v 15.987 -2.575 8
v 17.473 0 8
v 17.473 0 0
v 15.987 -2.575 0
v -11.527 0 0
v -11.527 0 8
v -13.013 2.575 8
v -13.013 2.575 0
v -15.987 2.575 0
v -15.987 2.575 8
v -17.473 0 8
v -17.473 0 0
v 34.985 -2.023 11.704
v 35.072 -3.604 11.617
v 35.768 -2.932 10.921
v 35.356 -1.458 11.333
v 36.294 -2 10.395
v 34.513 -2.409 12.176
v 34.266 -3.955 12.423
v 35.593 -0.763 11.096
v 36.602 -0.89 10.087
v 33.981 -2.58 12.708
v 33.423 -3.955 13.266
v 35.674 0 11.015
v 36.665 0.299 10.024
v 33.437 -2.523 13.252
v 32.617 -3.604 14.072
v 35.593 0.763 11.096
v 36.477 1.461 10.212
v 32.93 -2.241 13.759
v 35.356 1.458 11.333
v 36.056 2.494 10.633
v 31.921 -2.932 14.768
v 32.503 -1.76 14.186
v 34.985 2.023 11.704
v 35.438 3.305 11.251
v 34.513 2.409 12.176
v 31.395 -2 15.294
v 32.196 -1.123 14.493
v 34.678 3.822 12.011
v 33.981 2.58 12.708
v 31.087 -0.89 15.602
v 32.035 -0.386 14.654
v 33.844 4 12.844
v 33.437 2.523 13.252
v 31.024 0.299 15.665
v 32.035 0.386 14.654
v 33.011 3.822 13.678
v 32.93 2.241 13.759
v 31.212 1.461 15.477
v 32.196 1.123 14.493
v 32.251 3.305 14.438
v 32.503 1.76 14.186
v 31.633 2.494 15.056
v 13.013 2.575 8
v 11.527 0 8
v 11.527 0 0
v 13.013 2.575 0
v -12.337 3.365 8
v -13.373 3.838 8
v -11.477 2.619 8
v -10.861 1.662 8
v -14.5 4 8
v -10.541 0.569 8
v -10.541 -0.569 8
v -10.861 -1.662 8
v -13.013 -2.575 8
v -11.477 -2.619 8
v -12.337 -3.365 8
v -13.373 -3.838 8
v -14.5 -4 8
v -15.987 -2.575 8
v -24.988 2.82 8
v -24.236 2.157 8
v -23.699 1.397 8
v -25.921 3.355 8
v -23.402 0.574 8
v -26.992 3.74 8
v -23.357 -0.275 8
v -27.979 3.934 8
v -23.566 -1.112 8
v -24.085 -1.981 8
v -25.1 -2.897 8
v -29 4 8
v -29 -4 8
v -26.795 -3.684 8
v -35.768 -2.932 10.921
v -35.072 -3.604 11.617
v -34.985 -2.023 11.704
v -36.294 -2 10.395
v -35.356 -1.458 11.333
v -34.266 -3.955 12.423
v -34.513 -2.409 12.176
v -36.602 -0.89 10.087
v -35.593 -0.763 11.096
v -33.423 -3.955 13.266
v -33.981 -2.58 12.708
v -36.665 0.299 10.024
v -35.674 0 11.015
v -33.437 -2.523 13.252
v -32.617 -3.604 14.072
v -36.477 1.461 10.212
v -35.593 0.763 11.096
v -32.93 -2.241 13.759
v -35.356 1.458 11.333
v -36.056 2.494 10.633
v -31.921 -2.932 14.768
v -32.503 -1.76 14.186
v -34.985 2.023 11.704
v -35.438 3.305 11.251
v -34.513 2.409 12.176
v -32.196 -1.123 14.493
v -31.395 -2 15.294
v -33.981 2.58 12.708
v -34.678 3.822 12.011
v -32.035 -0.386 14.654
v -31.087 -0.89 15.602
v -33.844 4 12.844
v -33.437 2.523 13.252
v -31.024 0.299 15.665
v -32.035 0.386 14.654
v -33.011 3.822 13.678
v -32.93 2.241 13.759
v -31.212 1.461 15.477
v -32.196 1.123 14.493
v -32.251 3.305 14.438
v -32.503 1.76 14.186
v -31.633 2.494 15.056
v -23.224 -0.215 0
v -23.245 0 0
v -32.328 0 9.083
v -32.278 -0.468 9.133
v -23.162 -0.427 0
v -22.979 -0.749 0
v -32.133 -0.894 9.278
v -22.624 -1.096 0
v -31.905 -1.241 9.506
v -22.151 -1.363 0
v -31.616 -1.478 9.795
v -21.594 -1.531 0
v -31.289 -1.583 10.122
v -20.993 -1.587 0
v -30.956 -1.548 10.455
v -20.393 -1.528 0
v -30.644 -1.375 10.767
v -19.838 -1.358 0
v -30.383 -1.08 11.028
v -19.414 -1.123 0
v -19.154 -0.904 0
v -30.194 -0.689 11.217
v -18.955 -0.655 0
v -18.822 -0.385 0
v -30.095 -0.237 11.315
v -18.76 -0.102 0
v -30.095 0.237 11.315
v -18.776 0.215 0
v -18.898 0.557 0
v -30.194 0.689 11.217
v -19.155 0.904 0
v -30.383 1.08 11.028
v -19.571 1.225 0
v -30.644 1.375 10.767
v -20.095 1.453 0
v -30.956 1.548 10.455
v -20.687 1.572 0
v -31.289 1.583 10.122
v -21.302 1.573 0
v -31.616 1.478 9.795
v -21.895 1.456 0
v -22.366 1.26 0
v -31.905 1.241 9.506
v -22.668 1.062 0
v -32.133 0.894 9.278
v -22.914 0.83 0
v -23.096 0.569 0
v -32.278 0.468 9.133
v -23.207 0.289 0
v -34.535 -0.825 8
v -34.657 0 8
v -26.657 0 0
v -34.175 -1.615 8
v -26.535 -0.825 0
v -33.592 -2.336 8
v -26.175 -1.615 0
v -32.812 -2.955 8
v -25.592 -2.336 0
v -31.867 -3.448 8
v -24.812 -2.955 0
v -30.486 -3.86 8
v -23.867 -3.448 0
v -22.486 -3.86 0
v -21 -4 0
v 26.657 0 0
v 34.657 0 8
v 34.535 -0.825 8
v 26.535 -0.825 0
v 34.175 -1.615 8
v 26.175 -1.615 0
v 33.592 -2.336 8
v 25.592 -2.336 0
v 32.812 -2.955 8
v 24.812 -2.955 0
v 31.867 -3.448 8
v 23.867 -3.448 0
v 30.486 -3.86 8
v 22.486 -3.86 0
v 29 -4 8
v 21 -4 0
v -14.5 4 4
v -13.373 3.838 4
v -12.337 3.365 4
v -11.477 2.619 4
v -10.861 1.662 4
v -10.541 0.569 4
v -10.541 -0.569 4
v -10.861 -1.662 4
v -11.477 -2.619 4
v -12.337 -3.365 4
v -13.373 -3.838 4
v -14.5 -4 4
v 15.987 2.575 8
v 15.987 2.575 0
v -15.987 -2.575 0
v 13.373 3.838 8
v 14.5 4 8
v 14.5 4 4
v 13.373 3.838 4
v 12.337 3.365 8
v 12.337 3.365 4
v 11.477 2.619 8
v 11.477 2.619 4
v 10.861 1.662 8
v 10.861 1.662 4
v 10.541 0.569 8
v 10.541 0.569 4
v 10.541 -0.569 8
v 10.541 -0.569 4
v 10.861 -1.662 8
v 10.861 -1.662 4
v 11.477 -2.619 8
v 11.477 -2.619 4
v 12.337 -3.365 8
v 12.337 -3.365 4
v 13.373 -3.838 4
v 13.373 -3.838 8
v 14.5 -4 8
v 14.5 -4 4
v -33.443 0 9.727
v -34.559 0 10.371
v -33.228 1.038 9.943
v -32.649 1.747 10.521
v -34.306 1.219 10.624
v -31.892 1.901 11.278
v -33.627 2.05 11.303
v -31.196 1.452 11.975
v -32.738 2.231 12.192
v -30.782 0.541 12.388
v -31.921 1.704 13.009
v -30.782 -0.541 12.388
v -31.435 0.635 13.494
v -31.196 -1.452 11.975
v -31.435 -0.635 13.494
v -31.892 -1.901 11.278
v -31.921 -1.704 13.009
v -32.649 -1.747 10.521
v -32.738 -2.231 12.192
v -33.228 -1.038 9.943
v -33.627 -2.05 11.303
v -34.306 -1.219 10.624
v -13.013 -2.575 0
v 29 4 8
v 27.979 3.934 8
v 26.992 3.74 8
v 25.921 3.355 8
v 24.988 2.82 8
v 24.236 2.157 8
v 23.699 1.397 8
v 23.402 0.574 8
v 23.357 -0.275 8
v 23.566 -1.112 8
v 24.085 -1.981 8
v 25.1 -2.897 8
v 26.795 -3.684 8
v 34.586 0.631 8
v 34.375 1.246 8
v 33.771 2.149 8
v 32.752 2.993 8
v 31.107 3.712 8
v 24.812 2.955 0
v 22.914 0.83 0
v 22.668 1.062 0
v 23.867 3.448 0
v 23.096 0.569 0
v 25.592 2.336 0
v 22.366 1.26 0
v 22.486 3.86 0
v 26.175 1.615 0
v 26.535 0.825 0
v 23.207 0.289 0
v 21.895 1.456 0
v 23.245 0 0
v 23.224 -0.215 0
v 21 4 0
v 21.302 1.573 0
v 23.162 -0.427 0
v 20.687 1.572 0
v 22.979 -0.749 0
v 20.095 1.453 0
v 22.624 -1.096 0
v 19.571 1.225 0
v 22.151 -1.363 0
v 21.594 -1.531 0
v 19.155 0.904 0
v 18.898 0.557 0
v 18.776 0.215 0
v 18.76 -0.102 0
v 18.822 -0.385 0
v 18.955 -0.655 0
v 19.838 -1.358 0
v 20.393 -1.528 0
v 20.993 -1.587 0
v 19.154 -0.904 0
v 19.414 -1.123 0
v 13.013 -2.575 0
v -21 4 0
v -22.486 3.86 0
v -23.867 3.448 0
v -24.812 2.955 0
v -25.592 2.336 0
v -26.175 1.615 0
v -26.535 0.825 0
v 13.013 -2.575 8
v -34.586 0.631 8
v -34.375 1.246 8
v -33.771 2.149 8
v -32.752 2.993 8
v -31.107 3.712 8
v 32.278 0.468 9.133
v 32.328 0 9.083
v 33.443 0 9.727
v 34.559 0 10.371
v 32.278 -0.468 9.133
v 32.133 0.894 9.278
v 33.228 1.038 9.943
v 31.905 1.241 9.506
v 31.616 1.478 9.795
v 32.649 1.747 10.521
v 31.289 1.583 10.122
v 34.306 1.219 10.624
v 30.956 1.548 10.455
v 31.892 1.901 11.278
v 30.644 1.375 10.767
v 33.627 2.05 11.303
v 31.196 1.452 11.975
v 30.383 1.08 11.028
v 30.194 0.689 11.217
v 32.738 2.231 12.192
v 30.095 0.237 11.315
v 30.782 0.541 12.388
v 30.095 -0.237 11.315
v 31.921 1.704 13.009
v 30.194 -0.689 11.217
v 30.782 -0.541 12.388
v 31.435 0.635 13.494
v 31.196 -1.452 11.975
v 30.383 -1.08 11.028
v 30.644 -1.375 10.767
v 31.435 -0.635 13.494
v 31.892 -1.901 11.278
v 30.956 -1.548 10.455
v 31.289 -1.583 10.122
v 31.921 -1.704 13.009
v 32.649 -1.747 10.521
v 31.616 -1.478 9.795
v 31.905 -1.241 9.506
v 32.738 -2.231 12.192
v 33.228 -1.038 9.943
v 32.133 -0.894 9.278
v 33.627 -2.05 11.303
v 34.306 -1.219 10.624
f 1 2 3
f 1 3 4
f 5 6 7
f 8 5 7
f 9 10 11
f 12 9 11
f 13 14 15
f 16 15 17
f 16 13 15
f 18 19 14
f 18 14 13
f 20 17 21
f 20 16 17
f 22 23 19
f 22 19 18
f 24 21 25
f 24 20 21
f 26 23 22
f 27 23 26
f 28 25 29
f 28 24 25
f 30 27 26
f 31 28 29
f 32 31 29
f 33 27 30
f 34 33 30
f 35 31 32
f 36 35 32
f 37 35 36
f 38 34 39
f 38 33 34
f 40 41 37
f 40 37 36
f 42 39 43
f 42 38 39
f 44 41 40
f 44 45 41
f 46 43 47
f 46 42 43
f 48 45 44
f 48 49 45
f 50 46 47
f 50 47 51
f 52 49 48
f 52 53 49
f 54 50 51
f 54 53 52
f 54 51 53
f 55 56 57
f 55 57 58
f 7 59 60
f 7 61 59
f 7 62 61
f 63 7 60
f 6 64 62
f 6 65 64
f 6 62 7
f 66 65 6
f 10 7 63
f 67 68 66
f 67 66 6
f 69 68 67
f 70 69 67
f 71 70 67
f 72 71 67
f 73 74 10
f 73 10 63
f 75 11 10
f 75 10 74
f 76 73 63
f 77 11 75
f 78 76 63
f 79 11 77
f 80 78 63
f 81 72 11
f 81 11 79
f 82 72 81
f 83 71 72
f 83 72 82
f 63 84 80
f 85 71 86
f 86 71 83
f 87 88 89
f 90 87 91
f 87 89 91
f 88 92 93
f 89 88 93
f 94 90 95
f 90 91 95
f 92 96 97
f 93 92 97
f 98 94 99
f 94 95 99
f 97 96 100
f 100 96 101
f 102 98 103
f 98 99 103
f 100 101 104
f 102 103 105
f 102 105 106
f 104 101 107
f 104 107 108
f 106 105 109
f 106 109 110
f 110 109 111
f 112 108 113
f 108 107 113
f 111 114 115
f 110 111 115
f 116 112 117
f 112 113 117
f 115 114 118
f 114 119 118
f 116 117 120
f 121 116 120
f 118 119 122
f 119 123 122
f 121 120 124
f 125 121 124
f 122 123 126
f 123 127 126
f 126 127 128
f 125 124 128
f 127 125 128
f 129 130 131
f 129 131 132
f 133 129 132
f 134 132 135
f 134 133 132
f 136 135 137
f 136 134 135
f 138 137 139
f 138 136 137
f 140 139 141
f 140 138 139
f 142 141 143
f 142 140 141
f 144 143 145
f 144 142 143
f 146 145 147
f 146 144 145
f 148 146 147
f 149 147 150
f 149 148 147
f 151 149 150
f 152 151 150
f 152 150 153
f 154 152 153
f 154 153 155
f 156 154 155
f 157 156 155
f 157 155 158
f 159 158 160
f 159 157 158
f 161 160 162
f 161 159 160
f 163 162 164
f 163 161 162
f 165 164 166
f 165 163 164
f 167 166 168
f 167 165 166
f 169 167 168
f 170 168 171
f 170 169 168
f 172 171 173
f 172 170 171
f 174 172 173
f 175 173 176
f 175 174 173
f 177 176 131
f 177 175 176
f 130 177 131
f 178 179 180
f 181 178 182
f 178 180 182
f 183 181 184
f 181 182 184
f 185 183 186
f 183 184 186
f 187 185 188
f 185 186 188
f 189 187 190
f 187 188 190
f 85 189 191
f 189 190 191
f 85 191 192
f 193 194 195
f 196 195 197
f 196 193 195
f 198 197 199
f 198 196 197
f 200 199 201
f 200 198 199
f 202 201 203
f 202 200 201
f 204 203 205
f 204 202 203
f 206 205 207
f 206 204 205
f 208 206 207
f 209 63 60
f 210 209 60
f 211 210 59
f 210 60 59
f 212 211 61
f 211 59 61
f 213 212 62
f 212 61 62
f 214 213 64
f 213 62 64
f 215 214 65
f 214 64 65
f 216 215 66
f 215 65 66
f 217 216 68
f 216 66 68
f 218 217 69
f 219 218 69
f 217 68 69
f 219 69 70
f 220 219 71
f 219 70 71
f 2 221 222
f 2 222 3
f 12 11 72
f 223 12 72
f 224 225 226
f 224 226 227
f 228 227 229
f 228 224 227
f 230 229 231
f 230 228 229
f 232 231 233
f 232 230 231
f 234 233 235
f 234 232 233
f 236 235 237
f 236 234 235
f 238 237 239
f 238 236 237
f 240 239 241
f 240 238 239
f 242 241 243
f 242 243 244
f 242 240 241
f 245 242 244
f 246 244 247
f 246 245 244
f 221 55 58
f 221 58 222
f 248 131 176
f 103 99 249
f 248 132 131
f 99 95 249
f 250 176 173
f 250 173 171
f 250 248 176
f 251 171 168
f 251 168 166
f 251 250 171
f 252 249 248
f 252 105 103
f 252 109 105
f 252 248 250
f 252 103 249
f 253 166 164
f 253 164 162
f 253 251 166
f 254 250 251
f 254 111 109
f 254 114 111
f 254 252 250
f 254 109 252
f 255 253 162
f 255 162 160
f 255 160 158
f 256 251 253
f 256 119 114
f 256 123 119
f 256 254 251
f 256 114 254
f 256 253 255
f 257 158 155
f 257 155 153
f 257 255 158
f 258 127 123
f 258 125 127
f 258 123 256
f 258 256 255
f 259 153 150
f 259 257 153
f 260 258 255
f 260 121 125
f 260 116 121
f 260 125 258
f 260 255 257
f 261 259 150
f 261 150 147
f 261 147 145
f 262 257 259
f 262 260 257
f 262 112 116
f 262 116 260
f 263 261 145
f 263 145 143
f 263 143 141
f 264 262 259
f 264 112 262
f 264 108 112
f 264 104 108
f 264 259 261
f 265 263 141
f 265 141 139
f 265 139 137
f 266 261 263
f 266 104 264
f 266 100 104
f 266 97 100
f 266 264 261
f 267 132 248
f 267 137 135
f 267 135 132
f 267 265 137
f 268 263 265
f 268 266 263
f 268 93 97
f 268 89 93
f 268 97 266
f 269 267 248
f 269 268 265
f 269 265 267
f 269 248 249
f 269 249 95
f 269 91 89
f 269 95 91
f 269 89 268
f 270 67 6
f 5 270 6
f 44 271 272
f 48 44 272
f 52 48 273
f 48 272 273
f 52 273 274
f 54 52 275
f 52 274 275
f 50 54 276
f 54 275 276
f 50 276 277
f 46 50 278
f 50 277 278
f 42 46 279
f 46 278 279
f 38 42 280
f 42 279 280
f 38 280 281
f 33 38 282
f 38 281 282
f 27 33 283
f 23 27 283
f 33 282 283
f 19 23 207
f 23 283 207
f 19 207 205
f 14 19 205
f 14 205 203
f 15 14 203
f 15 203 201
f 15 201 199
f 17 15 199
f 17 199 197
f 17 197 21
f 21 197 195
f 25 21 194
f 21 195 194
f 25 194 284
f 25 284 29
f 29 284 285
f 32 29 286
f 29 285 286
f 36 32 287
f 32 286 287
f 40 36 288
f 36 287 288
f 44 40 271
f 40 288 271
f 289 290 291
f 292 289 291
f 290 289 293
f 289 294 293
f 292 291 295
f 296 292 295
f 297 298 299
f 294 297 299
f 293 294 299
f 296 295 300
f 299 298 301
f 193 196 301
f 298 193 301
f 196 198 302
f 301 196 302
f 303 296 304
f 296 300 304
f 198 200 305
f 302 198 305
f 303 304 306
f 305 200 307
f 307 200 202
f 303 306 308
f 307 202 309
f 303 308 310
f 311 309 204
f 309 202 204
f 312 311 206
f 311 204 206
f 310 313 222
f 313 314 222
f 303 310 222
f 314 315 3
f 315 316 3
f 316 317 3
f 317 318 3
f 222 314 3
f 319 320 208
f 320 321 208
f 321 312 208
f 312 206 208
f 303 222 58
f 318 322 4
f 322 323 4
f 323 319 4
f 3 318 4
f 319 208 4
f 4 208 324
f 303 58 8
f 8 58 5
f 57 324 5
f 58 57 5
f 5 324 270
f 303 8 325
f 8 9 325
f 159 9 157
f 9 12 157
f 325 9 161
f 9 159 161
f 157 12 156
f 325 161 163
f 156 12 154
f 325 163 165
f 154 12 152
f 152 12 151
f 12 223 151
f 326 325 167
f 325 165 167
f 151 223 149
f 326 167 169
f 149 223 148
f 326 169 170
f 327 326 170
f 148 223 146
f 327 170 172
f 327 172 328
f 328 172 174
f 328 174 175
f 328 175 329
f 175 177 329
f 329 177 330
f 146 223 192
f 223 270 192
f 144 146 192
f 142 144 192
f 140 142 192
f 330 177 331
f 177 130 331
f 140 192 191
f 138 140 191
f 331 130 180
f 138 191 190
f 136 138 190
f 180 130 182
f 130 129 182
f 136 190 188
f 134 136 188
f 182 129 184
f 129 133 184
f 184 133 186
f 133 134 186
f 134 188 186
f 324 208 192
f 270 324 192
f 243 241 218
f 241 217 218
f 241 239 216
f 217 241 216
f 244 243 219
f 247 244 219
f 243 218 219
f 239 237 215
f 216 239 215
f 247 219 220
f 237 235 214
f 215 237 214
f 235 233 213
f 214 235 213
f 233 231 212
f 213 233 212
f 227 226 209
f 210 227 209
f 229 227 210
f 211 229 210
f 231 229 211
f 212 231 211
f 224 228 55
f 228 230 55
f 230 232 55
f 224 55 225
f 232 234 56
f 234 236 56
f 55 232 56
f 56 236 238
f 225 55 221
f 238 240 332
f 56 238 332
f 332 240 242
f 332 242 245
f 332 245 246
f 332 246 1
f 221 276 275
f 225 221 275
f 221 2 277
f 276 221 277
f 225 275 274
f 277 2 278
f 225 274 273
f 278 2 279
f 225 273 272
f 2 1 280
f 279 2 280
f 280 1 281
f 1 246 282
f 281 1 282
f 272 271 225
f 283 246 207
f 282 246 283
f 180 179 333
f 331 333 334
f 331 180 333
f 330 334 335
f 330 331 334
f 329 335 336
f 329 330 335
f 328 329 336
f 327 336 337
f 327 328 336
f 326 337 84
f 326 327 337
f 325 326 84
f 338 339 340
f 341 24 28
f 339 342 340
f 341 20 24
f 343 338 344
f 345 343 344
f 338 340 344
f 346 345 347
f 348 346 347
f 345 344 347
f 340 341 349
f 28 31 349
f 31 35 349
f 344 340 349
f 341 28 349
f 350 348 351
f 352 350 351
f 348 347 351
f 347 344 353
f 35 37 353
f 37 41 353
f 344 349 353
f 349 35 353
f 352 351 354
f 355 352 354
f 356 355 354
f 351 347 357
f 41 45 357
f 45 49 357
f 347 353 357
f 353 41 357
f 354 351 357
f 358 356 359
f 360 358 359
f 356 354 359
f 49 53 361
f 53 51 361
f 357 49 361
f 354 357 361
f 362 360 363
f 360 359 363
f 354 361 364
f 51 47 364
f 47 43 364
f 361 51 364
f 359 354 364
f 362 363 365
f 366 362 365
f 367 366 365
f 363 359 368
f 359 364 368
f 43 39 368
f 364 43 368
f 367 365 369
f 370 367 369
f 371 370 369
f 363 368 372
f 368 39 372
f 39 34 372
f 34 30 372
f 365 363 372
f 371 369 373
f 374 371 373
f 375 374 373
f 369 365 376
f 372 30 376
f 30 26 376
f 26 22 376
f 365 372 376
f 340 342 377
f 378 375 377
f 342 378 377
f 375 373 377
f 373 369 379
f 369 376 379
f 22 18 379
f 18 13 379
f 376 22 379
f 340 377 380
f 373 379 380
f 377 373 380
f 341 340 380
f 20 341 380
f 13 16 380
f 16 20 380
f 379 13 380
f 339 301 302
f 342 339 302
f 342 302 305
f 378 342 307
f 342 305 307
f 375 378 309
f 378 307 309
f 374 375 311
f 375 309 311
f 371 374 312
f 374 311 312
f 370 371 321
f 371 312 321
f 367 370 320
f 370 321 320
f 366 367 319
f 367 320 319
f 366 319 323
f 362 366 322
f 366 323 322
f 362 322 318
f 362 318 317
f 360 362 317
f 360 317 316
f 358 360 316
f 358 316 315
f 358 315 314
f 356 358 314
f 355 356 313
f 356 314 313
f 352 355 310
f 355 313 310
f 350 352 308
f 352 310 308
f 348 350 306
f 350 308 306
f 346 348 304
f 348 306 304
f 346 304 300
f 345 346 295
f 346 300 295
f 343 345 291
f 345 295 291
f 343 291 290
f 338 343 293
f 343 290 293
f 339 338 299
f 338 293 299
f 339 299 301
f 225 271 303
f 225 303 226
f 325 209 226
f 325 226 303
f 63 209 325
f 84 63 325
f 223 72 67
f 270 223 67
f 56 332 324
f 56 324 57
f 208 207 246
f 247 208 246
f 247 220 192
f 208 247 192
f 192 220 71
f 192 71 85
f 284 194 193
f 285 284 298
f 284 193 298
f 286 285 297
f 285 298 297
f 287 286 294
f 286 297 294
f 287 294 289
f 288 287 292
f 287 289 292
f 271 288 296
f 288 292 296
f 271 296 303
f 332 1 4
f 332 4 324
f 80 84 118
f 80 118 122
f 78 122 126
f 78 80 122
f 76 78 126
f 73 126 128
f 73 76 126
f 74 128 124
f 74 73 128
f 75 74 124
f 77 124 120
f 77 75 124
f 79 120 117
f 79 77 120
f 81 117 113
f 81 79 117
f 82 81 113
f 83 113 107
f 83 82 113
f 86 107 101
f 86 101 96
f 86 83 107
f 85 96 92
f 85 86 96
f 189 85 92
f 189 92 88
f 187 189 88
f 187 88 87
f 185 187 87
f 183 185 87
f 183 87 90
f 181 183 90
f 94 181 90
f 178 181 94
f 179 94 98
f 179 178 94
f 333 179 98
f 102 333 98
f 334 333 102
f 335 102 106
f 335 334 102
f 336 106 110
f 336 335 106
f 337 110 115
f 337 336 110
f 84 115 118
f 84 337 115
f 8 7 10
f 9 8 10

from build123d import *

# Parameters (mm, degrees)
F1_DEPTH  = 4
F2_R      = 3.99999
F4_DEPTH  = 8
F6_DEPTH  = 4
F9_R      = 4
F10_DEPTH = 6.851053331
F12_SIZE2 = 1
F12_SIZE  = 3.7320508076


# Not quite as in the source:
# - a fillet or chamfer is up to 0.001 mm smaller than in the source, because OpenCascade refuses the exact size


with BuildPart() as f1:
    # F0 (on Front) → F1 (new body, symmetric)
    with BuildSketch(Plane.XZ):
        Polygon((-26.6568542495, 0), (0, 0), (0, 8), (-34.6568542495, 8), align=None)
    extrude(amount=F1_DEPTH, both=True)

    # F2 (radius 4 in the source; OpenCascade refuses exactly that, so slightly less here)
    f2_edges = [f1.edges().sort_by_distance(p)[0] for p in [
        (-30.656854, 4, 4),
        (-30.656854, -4, 4),
    ]]
    fillet(f2_edges, radius=F2_R)

    # F3 (on face) → F4 (cut, through all)
    with BuildSketch(Plane.XY.offset(8)):
        Polygon((-11.5266461137, 0), (-13.0133230568, 2.575), (-15.9866769432, 2.575), (-17.4733538863, 0), (-15.9866769432, -2.575), (-13.0133230568, -2.575), align=None)
    extrude(amount=-F4_DEPTH, mode=Mode.SUBTRACT)

    # F5 (on face) → F6 (cut)
    with BuildSketch(Plane.XY.offset(8)):
        with BuildLine():
            ThreePointArc((-14.5, 4), (-10.5, 0), (-14.5, -4))
            Line((-14.5, -4), (0, -4))
            Line((0, -4), (0, 4))
            Line((0, 4), (-14.5, 4))
        make_face()
    extrude(amount=-F6_DEPTH, mode=Mode.SUBTRACT)

    # F9 (on line) → F10 (join, symmetric)
    with BuildSketch(Plane(origin=(-18.5, 0, 18.5), x_dir=(0, 1, 0), z_dir=(0.7071067812, 0, -0.7071067812))):
        with Locations((0, -14.8492424049)):
            Circle(F9_R)
    extrude(amount=F10_DEPTH, both=True)

    # F7 (on Front) → F11 (revolve, cut)
    with BuildSketch(Plane.XZ):
        Polygon((-11.4302859145, -11.8147781158), (-10.3077538993, -10.6922461007), (-44.6173825807, 23.6173825807), (-45.7399145958, 22.4948505656), align=None)
    revolve(axis=Axis((-27.46256824, 0, 6.46256824), (-0.7071067812, 0, 0.7071067812)), mode=Mode.SUBTRACT)

    # F12
    f12_edges = [f1.edges().sort_by_distance(p)[0] for p in [
        (-32.721894, 0, 13.966958),
    ]]
    f12_side = f1.faces().sort_by_distance((-25.685621, 0, 6.930685))[0]
    chamfer(f12_edges, length=F12_SIZE, length2=F12_SIZE2, reference=f12_side)

    # F13: F1 across face


with BuildPart() as f1_1:
    add(f1.part)
    add(f1.part.mirror(Plane(origin=(0, 0, 2), x_dir=(0, 1, 0), z_dir=(1, 0, 0))))


solid = f1_1.part
